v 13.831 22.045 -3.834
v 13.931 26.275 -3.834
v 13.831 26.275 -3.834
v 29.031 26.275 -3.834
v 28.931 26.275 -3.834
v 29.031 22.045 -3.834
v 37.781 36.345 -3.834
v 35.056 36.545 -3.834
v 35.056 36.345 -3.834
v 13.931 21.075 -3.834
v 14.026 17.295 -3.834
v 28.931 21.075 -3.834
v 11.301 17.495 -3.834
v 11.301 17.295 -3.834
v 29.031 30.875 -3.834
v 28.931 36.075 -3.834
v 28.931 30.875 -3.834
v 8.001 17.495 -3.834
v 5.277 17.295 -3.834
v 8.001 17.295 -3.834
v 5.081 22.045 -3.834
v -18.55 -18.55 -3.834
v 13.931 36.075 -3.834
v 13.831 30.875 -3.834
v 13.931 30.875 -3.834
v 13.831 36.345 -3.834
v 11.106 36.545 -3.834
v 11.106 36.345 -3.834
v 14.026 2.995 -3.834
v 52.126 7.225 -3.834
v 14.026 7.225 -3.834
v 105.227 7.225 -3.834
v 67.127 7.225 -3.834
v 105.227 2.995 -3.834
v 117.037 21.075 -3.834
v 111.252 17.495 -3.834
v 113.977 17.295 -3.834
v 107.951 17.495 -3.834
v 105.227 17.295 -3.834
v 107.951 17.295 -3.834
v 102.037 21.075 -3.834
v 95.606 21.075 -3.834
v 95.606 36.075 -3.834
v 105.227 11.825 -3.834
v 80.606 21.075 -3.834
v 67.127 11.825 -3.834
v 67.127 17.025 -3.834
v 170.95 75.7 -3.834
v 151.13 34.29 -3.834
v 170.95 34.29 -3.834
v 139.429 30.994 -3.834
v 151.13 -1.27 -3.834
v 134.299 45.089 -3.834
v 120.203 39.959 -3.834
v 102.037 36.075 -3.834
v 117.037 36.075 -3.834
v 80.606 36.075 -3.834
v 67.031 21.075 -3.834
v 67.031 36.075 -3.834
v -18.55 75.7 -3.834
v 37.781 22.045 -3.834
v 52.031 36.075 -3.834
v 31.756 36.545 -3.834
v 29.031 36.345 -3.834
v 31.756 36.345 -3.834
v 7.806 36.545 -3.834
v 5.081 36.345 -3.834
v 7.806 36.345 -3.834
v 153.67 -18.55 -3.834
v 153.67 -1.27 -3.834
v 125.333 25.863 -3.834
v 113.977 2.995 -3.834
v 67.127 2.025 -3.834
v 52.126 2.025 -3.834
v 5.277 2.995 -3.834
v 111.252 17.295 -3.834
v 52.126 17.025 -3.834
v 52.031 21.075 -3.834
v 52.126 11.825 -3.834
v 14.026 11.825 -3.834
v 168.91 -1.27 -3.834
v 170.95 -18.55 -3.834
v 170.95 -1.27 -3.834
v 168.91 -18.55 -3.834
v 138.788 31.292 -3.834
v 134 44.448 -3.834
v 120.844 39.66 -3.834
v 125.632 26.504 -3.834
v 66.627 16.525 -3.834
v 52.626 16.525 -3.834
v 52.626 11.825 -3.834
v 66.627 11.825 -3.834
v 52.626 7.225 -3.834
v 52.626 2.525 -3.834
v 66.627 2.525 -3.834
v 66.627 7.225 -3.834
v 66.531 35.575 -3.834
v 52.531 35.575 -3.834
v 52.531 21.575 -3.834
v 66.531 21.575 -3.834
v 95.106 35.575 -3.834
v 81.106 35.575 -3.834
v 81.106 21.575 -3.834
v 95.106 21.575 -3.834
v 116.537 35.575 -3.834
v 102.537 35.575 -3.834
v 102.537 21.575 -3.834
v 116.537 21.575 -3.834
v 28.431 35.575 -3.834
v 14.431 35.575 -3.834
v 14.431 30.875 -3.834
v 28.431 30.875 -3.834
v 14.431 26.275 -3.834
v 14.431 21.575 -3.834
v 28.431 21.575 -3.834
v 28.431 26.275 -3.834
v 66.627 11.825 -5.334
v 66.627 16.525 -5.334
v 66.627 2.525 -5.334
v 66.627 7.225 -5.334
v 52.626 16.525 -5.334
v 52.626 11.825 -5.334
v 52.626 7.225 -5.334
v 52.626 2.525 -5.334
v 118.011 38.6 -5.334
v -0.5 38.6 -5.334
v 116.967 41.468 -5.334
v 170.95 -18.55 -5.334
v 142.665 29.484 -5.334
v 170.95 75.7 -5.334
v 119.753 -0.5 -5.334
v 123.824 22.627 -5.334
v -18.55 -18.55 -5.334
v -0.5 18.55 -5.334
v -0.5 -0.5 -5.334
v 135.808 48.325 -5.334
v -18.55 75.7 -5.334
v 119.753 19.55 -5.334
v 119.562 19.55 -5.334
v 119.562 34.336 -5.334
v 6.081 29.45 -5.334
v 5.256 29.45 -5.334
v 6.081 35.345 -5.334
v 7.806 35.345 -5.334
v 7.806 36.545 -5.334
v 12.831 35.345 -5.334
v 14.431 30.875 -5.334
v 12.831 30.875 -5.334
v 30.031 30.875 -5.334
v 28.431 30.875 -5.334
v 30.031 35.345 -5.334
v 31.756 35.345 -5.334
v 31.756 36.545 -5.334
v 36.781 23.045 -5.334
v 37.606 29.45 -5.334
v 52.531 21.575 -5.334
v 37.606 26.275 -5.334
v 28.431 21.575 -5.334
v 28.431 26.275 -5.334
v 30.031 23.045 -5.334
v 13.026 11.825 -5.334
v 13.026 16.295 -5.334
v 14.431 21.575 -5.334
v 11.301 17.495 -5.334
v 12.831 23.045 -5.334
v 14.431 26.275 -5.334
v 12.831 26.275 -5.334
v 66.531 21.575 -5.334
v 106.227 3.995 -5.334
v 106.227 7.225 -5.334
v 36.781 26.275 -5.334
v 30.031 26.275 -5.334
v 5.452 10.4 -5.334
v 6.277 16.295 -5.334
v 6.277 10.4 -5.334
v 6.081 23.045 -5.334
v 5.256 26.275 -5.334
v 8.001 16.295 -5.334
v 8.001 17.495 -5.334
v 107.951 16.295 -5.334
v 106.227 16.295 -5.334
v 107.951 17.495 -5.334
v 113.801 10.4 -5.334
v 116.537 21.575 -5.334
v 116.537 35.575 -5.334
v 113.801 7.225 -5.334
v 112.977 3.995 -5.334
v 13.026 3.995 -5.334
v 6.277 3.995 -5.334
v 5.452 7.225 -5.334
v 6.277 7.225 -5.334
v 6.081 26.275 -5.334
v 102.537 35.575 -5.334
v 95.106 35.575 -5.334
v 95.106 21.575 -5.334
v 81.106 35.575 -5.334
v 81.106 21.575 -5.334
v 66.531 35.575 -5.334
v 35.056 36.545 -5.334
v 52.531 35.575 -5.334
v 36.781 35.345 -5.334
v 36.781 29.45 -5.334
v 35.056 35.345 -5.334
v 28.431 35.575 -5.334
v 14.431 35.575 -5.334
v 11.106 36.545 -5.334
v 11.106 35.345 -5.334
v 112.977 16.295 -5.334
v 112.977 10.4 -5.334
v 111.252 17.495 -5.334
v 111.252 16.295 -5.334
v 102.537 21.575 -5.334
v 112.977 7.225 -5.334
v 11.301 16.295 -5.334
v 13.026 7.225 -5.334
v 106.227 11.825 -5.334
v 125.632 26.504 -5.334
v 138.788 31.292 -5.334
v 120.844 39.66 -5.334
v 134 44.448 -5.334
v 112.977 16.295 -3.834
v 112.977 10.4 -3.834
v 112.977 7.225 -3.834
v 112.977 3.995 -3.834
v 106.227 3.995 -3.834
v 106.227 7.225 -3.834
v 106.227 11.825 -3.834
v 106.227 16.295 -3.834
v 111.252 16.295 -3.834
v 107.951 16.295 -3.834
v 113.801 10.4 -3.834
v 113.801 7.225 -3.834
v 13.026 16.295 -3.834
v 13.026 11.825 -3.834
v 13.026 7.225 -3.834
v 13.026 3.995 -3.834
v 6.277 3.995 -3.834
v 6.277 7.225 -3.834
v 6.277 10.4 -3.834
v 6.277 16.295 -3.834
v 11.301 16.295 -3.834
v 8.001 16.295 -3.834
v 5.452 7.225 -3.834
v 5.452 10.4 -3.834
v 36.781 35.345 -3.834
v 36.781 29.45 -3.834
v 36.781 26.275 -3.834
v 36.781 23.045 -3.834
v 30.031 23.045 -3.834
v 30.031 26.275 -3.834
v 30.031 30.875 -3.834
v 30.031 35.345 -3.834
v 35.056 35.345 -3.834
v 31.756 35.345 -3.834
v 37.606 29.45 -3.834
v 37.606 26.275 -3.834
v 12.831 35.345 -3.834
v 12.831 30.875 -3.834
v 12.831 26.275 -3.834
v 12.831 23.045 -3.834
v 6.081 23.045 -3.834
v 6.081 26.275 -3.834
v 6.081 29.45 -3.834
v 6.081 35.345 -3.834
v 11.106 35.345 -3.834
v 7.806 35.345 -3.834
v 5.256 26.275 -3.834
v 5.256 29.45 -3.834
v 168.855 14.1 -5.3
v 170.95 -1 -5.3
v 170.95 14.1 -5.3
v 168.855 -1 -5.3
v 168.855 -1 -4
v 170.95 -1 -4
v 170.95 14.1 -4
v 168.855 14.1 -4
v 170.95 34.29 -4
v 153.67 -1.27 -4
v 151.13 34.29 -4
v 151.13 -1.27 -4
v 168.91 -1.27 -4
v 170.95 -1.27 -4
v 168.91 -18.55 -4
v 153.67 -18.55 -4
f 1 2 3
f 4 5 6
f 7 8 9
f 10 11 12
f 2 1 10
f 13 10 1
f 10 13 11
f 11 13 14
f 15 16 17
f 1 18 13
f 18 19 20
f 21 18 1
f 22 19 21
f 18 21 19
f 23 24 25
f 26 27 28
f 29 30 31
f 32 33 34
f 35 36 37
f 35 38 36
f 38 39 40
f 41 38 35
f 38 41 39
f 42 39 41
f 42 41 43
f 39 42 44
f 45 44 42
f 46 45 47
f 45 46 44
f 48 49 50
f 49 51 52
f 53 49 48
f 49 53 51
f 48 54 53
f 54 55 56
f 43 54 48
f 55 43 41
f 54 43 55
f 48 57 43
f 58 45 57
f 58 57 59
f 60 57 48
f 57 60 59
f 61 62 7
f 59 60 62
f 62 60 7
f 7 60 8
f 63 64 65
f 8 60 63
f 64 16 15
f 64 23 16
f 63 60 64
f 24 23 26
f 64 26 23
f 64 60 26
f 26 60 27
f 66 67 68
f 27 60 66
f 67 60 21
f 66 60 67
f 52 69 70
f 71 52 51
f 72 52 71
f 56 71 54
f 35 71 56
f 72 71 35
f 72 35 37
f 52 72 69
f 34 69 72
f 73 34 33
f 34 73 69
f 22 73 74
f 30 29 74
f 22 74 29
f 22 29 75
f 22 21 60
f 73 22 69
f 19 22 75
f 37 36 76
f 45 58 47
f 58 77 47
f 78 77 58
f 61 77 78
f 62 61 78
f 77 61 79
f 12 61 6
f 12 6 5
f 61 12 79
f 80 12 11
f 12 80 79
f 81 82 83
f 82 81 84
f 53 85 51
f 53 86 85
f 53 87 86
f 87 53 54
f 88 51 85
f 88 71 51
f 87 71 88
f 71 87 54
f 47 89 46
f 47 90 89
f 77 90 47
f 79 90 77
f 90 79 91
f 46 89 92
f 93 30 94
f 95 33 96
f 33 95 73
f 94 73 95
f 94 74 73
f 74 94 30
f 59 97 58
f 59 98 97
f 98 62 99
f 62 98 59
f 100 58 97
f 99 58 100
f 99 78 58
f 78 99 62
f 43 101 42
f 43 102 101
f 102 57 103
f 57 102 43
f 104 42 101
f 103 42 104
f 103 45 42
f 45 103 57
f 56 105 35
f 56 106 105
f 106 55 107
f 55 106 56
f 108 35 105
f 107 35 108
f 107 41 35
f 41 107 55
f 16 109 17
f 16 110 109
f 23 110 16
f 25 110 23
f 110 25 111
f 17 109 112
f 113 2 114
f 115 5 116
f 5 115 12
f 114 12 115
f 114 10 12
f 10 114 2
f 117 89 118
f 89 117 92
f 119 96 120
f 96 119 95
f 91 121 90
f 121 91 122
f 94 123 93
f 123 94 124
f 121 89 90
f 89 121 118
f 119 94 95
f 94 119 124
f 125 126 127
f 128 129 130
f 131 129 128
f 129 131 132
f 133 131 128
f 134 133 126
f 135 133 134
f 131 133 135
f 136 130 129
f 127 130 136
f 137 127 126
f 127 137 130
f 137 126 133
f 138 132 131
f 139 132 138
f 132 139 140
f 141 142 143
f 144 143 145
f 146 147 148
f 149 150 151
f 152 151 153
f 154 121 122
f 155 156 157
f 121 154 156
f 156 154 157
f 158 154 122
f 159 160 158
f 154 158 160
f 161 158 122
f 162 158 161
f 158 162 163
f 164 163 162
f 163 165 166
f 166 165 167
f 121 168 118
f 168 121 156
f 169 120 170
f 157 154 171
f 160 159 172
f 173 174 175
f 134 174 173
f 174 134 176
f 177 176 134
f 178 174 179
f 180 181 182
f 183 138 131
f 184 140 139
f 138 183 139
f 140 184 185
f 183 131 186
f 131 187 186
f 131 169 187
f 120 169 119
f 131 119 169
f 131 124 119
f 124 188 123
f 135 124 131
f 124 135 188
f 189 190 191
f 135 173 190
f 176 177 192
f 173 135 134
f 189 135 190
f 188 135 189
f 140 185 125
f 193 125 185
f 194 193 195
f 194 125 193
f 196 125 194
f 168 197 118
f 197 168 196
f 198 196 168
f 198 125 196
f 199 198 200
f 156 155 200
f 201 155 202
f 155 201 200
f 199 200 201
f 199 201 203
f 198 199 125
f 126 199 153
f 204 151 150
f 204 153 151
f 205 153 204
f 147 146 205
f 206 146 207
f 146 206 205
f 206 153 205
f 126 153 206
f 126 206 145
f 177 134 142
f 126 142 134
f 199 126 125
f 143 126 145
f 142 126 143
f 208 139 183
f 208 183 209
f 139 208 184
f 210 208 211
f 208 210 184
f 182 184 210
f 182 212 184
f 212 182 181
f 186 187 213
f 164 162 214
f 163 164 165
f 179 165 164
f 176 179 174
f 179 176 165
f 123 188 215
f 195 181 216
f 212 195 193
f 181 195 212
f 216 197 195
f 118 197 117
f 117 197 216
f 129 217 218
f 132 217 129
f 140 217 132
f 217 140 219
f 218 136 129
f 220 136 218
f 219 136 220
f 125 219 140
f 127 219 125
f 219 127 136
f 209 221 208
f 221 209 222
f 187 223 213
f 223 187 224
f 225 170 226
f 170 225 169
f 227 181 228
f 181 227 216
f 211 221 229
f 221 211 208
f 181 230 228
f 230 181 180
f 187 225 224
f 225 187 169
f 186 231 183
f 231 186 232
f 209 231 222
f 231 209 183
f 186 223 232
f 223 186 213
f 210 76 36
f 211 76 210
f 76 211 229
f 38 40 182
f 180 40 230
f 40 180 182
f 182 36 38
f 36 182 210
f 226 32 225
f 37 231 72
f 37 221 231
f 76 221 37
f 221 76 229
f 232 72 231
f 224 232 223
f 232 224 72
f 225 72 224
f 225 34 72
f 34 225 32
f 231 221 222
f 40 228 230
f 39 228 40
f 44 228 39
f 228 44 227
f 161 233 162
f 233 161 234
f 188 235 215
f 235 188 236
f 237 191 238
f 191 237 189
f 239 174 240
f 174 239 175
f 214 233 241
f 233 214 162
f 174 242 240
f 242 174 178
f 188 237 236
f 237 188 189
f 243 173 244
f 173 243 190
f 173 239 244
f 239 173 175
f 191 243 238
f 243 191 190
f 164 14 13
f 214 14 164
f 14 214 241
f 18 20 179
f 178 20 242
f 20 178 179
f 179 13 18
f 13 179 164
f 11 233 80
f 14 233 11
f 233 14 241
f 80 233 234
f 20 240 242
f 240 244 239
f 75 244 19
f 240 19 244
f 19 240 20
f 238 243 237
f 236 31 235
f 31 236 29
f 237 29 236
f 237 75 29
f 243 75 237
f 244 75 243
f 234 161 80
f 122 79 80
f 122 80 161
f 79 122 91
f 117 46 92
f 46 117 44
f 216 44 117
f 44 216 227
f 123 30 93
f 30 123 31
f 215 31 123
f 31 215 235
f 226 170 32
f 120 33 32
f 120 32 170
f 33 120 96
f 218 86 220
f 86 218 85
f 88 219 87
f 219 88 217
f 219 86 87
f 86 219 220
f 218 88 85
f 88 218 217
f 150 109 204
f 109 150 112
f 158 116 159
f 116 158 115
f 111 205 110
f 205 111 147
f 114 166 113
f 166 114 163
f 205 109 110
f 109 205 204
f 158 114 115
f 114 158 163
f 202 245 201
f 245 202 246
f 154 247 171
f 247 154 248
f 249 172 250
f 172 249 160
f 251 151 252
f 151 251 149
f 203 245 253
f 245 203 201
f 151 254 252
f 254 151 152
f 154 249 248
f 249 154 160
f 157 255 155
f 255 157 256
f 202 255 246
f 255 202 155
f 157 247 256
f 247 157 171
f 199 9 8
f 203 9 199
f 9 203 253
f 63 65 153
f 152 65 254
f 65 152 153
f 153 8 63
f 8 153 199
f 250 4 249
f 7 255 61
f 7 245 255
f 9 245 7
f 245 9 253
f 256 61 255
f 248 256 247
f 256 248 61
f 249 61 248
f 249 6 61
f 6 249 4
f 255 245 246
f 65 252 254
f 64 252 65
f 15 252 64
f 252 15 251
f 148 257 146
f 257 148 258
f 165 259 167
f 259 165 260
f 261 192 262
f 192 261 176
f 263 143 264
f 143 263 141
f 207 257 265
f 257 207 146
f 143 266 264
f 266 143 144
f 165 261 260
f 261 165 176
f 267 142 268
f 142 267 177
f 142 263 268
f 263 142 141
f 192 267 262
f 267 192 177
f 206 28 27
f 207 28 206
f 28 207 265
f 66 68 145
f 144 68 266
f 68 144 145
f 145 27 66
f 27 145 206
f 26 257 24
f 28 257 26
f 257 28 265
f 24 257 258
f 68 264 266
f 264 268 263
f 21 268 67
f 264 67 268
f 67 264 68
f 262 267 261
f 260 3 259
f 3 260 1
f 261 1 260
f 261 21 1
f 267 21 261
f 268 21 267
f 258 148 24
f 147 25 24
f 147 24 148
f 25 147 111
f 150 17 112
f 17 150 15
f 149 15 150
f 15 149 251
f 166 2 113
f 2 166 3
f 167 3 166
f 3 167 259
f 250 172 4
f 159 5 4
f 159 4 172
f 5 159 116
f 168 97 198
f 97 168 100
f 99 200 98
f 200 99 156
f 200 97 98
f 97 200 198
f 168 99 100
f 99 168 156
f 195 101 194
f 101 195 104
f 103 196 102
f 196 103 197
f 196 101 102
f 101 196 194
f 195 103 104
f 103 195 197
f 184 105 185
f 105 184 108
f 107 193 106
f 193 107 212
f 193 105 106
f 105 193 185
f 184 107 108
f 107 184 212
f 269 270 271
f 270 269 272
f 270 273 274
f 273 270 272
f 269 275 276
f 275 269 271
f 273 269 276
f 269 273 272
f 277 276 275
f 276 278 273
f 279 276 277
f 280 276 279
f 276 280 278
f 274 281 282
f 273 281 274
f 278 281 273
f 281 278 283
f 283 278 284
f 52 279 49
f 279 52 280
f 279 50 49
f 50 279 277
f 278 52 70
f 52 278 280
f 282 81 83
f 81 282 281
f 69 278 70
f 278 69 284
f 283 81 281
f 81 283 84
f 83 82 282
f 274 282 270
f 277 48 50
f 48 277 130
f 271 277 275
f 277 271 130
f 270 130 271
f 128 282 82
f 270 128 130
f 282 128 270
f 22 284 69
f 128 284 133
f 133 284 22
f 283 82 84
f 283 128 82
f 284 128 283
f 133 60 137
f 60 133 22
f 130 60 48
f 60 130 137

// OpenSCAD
// file: ../../../lib/circuits/helpers.scad
function bu(u) = u * 2.54;

module breadboard_row(number, orientation="vertical") {
  children();
  if(number > 1) {
    if(orientation == "vertical") {
      translate([0,bu(1),0])
        breadboard_row(number-1, orientation=orientation) {
          children();
        }
    } else {
      translate([bu(1),0,0])
        breadboard_row(number-1, orientation=orientation){
          children();
        }
    }
  }
}
// file: ../../../lib/switches/rgb.scad
include <../variables.scad>

module rgb_row_trace_connection(width, height, xpos, ypos, rgb, connections) {
  half_width = u_mm(width)/2;
  half_height = u_mm(height)/2;
  if(connections[3] == "connect") {
    translate([1-half_width,8.875,0]){
      circle(d=0.8,$fn=40);
      offset(0.4)
        polygon(points=[[0,-0.01],[0,0.01],[u_mm(-xpos)-2, u_mm(-ypos)+0.01],[u_mm(-xpos)-2, u_mm(-ypos)-0.01]]);
    }
    translate([1-half_width,4.9,0]){
      circle(d=0.8,$fn=40);
      offset(0.4)
        polygon(points=[[0,-0.01],[0,0.01],[u_mm(-xpos)-2, u_mm(-ypos)+0.01],[u_mm(-xpos)-2, u_mm(-ypos)-0.01]]);
    }
    translate([1-half_width,3.3,0]){
      circle(d=0.8,$fn=40);
      offset(0.4)
        polygon(points=[[0,-0.01],[0,0.01],[u_mm(-xpos)-2, u_mm(-ypos)+0.01],[u_mm(-xpos)-2, u_mm(-ypos)-0.01]]);
    }
  }
  if(connections[2] == "connect") {
    translate([half_width-1,8.875,0]) {
      circle(d=0.8,$fn=40);
    }
    translate([half_width-1,4.9,0]) {
      circle(d=0.8,$fn=40);
    }
    translate([half_width-1,3.3,0]){
      circle(d=0.8,$fn=40);
    }
  }
}

module rgb_pcb_drill(width=1, height=1, rgb=true, connections=["hole","hole","hole","hole"]) {
  half_width = u_mm(width)/2;
  half_height = u_mm(height)/2;
  translate([half_width,half_height,0]) {
    if(rgb == true) {
      // LED Hole
      translate([-1.875,3.4])
        square([3.75,3]);

      // LED D
      if(connections[3] == "hole")
        translate([1.3-half_width,8,0])
          circle(d=1,$fn=40);
      if(connections[2] == "hole")
        translate([half_width-1.3,8,0])
          circle(d=1,$fn=40);

      // LED G
      if(connections[3] == "hole")
        translate([1.3-half_width,5.4,0])
          circle(d=1,$fn=40);
      if(connections[2] == "hole")
        translate([half_width-1.3,5.4,0])
          circle(d=1,$fn=40);

      // LED V
      if(connections[3] == "hole")
        translate([1.3-half_width,2.8,0])
          circle(d=1,$fn=40);
      if(connections[2] == "hole")
        translate([half_width-1.3,2.8,0])
          circle(d=1,$fn=40);
    }

    children();
  }
}

module rgb_pcb_hole_traces(width=1, height=1, rgb=true, xpos=0, ypos=0, connections=["hole","hole","hole","hole"]) {
  half_width = u_mm(width)/2;
  half_height = u_mm(height)/2;
  translate([half_width,half_height,0]) {
    if(rgb == true) {
      // LED D
      if(connections[3] == "hole")
        translate([1.3-half_width,8,0])
          circle(d=2.5,$fn=40);
      if(connections[2] == "hole")
        translate([half_width-1.3,8,0])
          circle(d=2.5,$fn=40);

      // LED G
      if(connections[3] == "hole")
        translate([1.3-half_width,5.4,0])
          circle(d=2.5,$fn=40);
      if(connections[2] == "hole")
        translate([half_width-1.3,5.4,0])
          circle(d=2.5,$fn=40);

      // LED V
      if(connections[3] == "hole")
        translate([1.3-half_width,2.8,0])
          circle(d=2.5,$fn=40);
      if(connections[2] == "hole")
        translate([half_width-1.3,2.8,0])
          circle(d=2.5,$fn=40);
    }

    children();
  }
}

module rgb_pcb_traces(width=1, height=1, rgb=true, xpos=0, ypos=0, connections=["hole","hole","hole","hole"]) {
  half_width = u_mm(width)/2;
  half_height = u_mm(height)/2;
  rgb_pcb_hole_traces(width=width, height=height, rgb=rgb, connections=connections) {
    if(rgb == true) {
      rgb_row_trace_connection(width=width, height=height, xpos=xpos, ypos=ypos, rgb=rgb, connections=connections);
      v_left = connections[3] == "none" ? 1 : half_width-5;
      // LED G
      translate([1.25,5])
        square([2,2]);
      translate([2.7,8.5,0]) {
        length = connections[2] == "none" ? 2 : half_width-3.7; 
        square([length,0.75]);
      }
      translate([2.7,6.8])
        square([0.8,2.4]);
      translate([-3.5,6.2])
        square([7,0.8]);
      translate([-3.5,6.8])
        square([0.8,2.4]);
      translate([-4-v_left,8.5,0])
        square([v_left+1,0.75]);

      // LED D
      translate([-4-v_left,4.5,0])
        square([v_left,0.8]);
      translate([-4.5,4.5,0])
        square([0.8,1.3]);
      translate([-4.5,5,0])
        square([1.3,0.8]);
      translate([2,4,0])
        square([2,0.8]);
      translate([4,4,0])
        square([0.8,1.3]);
      translate([4,4.5,0]) {
        length = connections[2] == "none" ? 0 : half_width-5; 
        square([length,0.75]);
      }
      translate([-3.375,5])
        square([2,1.1]);
      translate([1.25,3.75])
        square([2,1.1]);

      // LED V
      v_right = connections[2] == "none" ? 0 : half_width-5.25;
      translate([-4-v_left,2.9,0])
        square([v_right+v_left+8.875,0.8]);
      translate([-3.375,3.5])
        square([2,1.35]);
    }

    children();
  }
}
// file: ../../../lib/switches/base.scad
include <../variables.scad>
include <rgb.scad>

// ["top", "bottom", "left", "right"]

module switch_row_trace_connection(width, height, xpos, ypos, rgb, connections) {
  half_width = u_mm(width)/2;
  half_height = u_mm(height)/2;
  if(connections[3] == "connect") {
    translate([1-half_width,-5.5,0]){
      circle(d=0.8,$fn=40);
      offset(0.4)
        polygon(points=[[0,-0.01],[0,0.01],[u_mm(-xpos)-2, u_mm(-ypos)+0.01],[u_mm(-xpos)-2, u_mm(-ypos)-0.01]]);
    }
  }
  if(connections[2] == "connect") {
    translate([half_width-1,-5.5,0]) {
      circle(d=0.8,$fn=40);
    }
  }
}

module switch_column_trace_connection(width, height, xpos, ypos, rgb, connections, last_xpos=0, last_ypos=0) {
  half_width = u_mm(width)/2;
  half_height = u_mm(height)/2;
  if(connections[1] == "connect") {
    translate([-u_mm((width-1)/2)-0.9,half_height-1,0]) {
      circle(d=0.8,$fn=40);
      offset(0.4)
        polygon(points=[[0,-0.01],[0,0.01],[u_mm((width-1)/2),0.01],[u_mm((width-1)/2),-0.01]]);
    }
  }
  if(connections[0] == "connect") {
    y_off = u_mm(ypos-last_ypos);
    x_off = u_mm(last_xpos-xpos);
    translate([-0.875,-1-y_off-half_height,0]) {
      offset(0.4)
        polygon(points=[[-0.01+x_off,0],[0.01+x_off,0],[0.01,2+y_off],[-0.01,2+y_off]]);
      translate([x_off-0.01,0]) {
        offset(0.4)
          polygon(points=[[0,-0.01],[0,0.01],[u_mm((width-1)/2)+1,0.01],[u_mm((width-1)/2)+1,-0.01]]);
      }
    }
  }
}

module switch_base_pcb_drill(width=1, height=1, rgb=true, single=true, connections=["hole","hole","hole","hole"]) {
  half_width = u_mm(width)/2;
  half_height = u_mm(height)/2;
  rgb_pcb_drill(width=width, height=height, rgb=rgb, connections=connections) {
    // Row
    if(connections[2] == "hole")
      translate([half_width-1.3,-5.5,0])
        circle(d=1,$fn=40);
    if(connections[3] == "hole")
      translate([1.3-half_width,-5.5,0])
        circle(d=1,$fn=40);

    // Column
    if(connections[1] == "hole")
      translate([-1,half_height-1.25,0])
        circle(d=1,$fn=40);
    if(connections[0] == "hole")
      translate([-1,1.25-half_height,0])
        circle(d=1,$fn=40);

    children();
  }
}

module switch_base_pcb_traces(width=1, height=1, rgb=true, xpos=0, ypos=0, connections=["hole","hole","hole","hole"], last_xpos=0, last_ypos=0, single=true) {
  half_width = u_mm(width)/2;
  half_height = u_mm(height)/2;
  rgb_pcb_traces(width=width, height=height, rgb=rgb, xpos=xpos, ypos=ypos, connections=connections) {
    switch_row_trace_connection(width, height, xpos, ypos, rgb, connections);
    if(single && !rgb)
      switch_column_trace_connection(width, height, xpos, ypos, rgb, connections, last_xpos=last_xpos, last_ypos=last_ypos);

    // Row
    if(connections[2] == "hole")
      translate([half_width-1.3,-5.5,0])
        circle(d=2.5,$fn=40);
    if(connections[3] == "hole")
      translate([1.3-half_width,-5.5,0])
        circle(d=2.5,$fn=40);

    // Column
    if(connections[1] == "hole")
      translate([-1,half_height-1.25,0])
        circle(d=2.4,$fn=40);
    if(connections[0] == "hole")
      translate([-1,1.25-half_height,0])
        circle(d=2.4,$fn=40);

    children();
  }
}

module switch_base_pcb_traces_bottom(width=1, height=1, rgb=true, xpos=0, ypos=0, connections=["hole","hole","hole","hole"], last_xpos=0, last_ypos=0) {
  half_width = u_mm(width)/2;
  half_height = u_mm(height)/2;
  rgb_pcb_hole_traces(width=width, height=height, rgb=rgb, connections=connections) {
    switch_column_trace_connection(width, height, xpos, ypos, rgb, connections, last_xpos=last_xpos, last_ypos=last_ypos);

    // Row
    if(connections[2] == "hole")
      translate([half_width-1.3,-5.5,0])
        circle(d=2.5,$fn=40);
    if(connections[3] == "hole")
      translate([1.3-half_width,-5.5,0])
        circle(d=2.5,$fn=40);

    // Column
    if(connections[1] == "hole")
      translate([-1,half_height-1.25,0])
        circle(d=2.5,$fn=40);
    if(connections[0] == "hole")
      translate([-1,1.25-half_height,0])
        circle(d=2.5,$fn=40);

    children();
  }
}
// file: ../../../lib/switches/footprints.scad
include <../variables.scad>
include <stabilizers.scad>

module pcb_switch_outline(width=1, height=1) {
  stab_extra = width >= 2 ? 2 : 0;
  translate([0,-stab_extra])
    square([u_mm(width)+0.01, u_mm(height)+0.01+stab_extra]);
}

module pcb_switch_space_outline(width=1, height=1, style="mx", cnc=false) {
  offset = height_for_style(style);
  stab_extra = width >= 2 ? 2 : 0;
  translate([-1,-1-stab_extra,2.834-offset])
    cube([u_mm(width) + 2, u_mm(height) + 2 + stab_extra, 1.166+offset]);
  translate([u_mm(width/2),u_mm(height/2)]) {
    translate([-7.5,-7.5,1.5-offset])
      cube([15,15,5]);
    translate([-7,-7,-10])
      cube([14,14,10]);
    translate([u_mm(-width/2)-0.5,u_mm(-height/2)-0.5,-20-offset])
      cube([u_mm(width)+1,u_mm(height)+1, 20]);
  }
  translate([hole_offset(width), hole_offset(height),-10])
    stab(width);
}
// file: ../../../lib/switches/stabilizers.scad
module stab_hole_render(distance){
  translate([14+distance+3.375,6.99,0]) {
    circle(d=3.175, $fn=40);
    translate([0,-15.24,0])
      circle(d=4.064, $fn=40);
  }
  translate([-6.75-distance+3.375,6.99,0]) {
    circle(d=3.175, $fn=40);
    translate([0,-15.24,0])
      circle(d=4.064, $fn=40);
  }
}

module stab_holes(width) {
  if (width >= 7) {
    stab_hole_render(39.6);
  } else if (width >= 6) {
    stab_hole_render(39.6);
  } else if(width >= 2) {
    stab_hole_render(1.6);
  }
}

module stab_render(distance, cnc=false, height=5.334) {
  translate([14+distance,1.47,0]){
    // Right Side Large Hole
    cube([6.75,12.3,10]);

    // Add 1/16" corner holes for milling
    if(cnc){
      translate([0.56,0.56,0])
        cylinder(h=10,d=1.59,$fn=20);
      translate([6.75-0.56,0.56,0])
        cylinder(h=10,d=1.59,$fn=20);
      translate([0.56,12.3-0.56,0])
        cylinder(h=10,d=1.59,$fn=20);
      translate([6.75-0.56,12.3-0.56,0])
        cylinder(h=10,d=1.59,$fn=20);
    }
    translate([5.75,3.23,0]){
      // Side hole for notch
      cube([1.825,3.175,10]);
      translate([1.825,1.59,0])
        if(cnc)
          resize([1.59,3.175,10])
            cylinder(h=10,d=1.59,$fn=20);
    }
    translate([1.725,11.3,0]){
      // Top Notch
      cube([3.3,2.2,10]);
      if(cnc)
        translate([1.65,2.2,0])
          resize([3.3,1,10])
            cylinder(h=10,d=1,$fn=20);
    }
    // Thin out for clip
    translate([-1,-1,10-height+1.5])
      cube([8.75,14.3,height-1.5]);
  }
  translate([-6.75-distance,1.47,0]){
    // Left Side Large Hole
    cube([6.75,12.3,10]);
    translate([-0.825,3.23,0]){
      // Side hole for notch
      cube([1.825,3.175,10]);
      if(cnc)
        translate([0,1.59,0])
          resize([1.59,3.175,10])
            cylinder(h=10,d=1.59,$fn=20);

    }
    translate([1.725,11.3,0]){
      // Top Notch
      cube([3.3,2.2,10]);
      if(cnc)
        translate([1.65,2.2,0])
          resize([3.3,1,10])
            cylinder(h=10,d=1,$fn=20);
    }
    if(cnc){
      translate([0.56,0.56,0])
        cylinder(h=10,d=1.59,$fn=20);
      translate([6.75-0.56,0.56,0])
        cylinder(h=10,d=1.59,$fn=20);
      translate([0.56,12.3-0.56,0])
        cylinder(h=10,d=1.59,$fn=20);
      translate([6.75-0.56,12.3-0.56,0])
        cylinder(h=10,d=1.59,$fn=20);
    }
    // Thin out for clip
    translate([-1,-1,10-height+1.5])
      cube([8.75,14.3,height-1.5]);
  }
  // Center shaft for bar
  translate([-distance-2,4.7,0]){
    cube([distance*2+20,4.6,10]);
  }
}

module stab(key_width, cnc=false) {
  if (key_width >= 7) {
    stab_render(39.6, cnc=cnc);
  } else if (key_width >= 6) {
    stab_render(39.6, cnc=cnc);
  } else if(key_width >= 2) {
    stab_render(1.6, cnc=cnc);
  }
}
// file: ../../../lib/circuits/wire.scad
module guage(guage=12) {
  fn=20;
  if(guage == 8) {
    circle(d=3.25, $fn=fn);
  } else if (guage == 10) {
    circle(d=2.59, $fn=fn);
  } else if (guage == 12) {
    circle(d=2.06, $fn=fn);
  } else if (guage == 14) {
    circle(d=1.57, $fn=fn);
  } else if (guage == 16) {
    circle(d=1.3, $fn=fn);
  }
}

module wire_pcb_drill(guage=12) {
  offset(0.1)
    guage(guage);
}

module wire_pcb_traces(guage=12) {
  offset(0.75)
    guage(guage);
}

module wire_pcb_outline(guage=12) {
  offset(1.5)
    guage(guage);
}

module wire_space_outline(guage=12) {
  linear_extrude(10)
    offset(0.1)
      guage(guage);
}
// file: ../../../lib/circuits/trrs.scad
module trrs_post(d=1.2) {
  translate([0,-d/4,0]) {
    circle(d=d, $fn=20);
    translate([-d/2,0,0]) {
      square([d,(d/2-.2)]);
    }
    translate([0,(d/2-.2),0]) {
      circle(d=d, $fn=20);
    }
  }
}

module trrs_pcb_drill(side="left") {
  translate([2.8,1.5]) {
    circle(d=2, $fn=20);
  }
  translate([2.8,8.5]) {
    circle(d=2, $fn=20);
  }
  translate([0.5,11.3,0]) {
    trrs_post();
  }
  translate([5.1,3.2,0]) {
    trrs_post();
  }
  translate([5.1,6.2,0]) {
    trrs_post();
  }
  translate([5.1,10.2,0]) {
    trrs_post();
  }
  if(side != "none"){
    offset = side == "left" ? 7.6 : -2;
    translate([offset,11.3]) {
      circle(d=1.2, $fn=20);
    }
    translate([offset,8.3]) {
      circle(d=1.2, $fn=20);
    }
    translate([offset,5.3]) {
      circle(d=1.2, $fn=20);
    }
    translate([offset,2.2]) {
      circle(d=1.2, $fn=20);
    }
  }
}

module trrs_pcb_traces(side="left") {
  translate([-1,9.7,0]){
    difference() {
      square([3,3]);
      if(side == "right") {
        translate([3,-1.8]) {
          rotate(45) {
            square(2);
          }
        }
      }
    }
  }
  translate([3.6,1.2,0]){
    difference() {
      square([3,3.5]);
      if(side == "left") {
        translate([3,2.3]) {
          rotate(45) {
            square(2);
          }
        }
      }
    }
  }
  translate([3.6,4.8,0]){
    difference() {
        square([3,3.5]);
        if(side == "left") {
          translate([3,2.3]) {
            rotate(45) {
              square(2);
            }
          }
        }
    }
  }
  translate([3.6,8.4,0]){
    difference() {
      square([3,3.2]);
      if(side == "left") {
        translate([3,1.8]) {
          rotate(45) {
            square(2);
          }
        }
      }
    }
  }
  if(side != "none"){
    translate([side == "left" ? 7.6 : -2,0,0]){
      translate([0,11.3]) {
        circle(d=3, $fn=20);
      }
      translate([0,8.3]) {
        circle(d=2.9, $fn=20);
      }
      translate([0,5.3]) {
        circle(d=3, $fn=20);
      }
      translate([0,2.2]) {
        circle(d=3, $fn=20);
      }
    }
    translate([side == "left" ? 5.6 : -2,0,0]){
      left_trace = side == "left" ? 2.5 : 7.6;
      translate([0,2.2]) {
        square([left_trace,1.5]);
      }
      translate([0,5.1]) {
        square([left_trace,1.5]);
      }
      if(side == "left") {
        translate([0,8.7]) {
          square([left_trace,0.9]);
        }
      }
      else {
        translate([0,8]) {
          square([4,1.6]);
        }
        translate([4,9]) {
          square([4,1.6]);
        }
        translate([2.8,9.4]) {
          rotate(-45) {
            square([1,1.7]);
          }
        }
      }
    }
    translate([side == "left" ? 0.5 : -2,0,0]){
      right_trace = side == "left" ? 7.1 : 2;
      translate([0,11.7]) {
        square([right_trace,1.3]);
      }
      translate([0,12]) {
        circle(1, $fn=20);
      }
      translate([right_trace,11.8]) {
        circle(1, $fn=20);
      }
    }
  }
}

module trrs_pcb_outline(side="left") {
  translate([-1,0,0]) {
    square([7.6,13.1]);
  }
  if(side != "none"){
    translate([side == "left" ? 5.6 : -3.5, 0]) {
      square([4,13.1]);
    }
  }
}

module trrs_space_outline(side="left") {
  translate([0,0,-5.3]) {
    linear_extrude(7){
      translate([-2,-1,0])
        square([9.6,15.1]);
      translate([0,-12.1,0])
        square([5.6,12.1]);
      if(side != "none")
        translate([side == "left" ? 5.6 : -4.5, -1])
          square([5,15.1]);
    }
  }
  translate([3,-2,-2.6]) {
    rotate([90,0,0]) {
      cylinder(d=10, h=30, $fn=100);
    }
  }
}
// file: ../../../lib/circuits/trace.scad
function vdef(vector, index) = len(vector) == index ? vector[index-1] : vector[index];
function vadd(vector, index, axis) = vdef(vector, index)[axis] > vdef(vector, index-1)[axis] ? 0.01 : -0.01;
function polygon_from_vector(vector) = 
  len(vector) > 0 ?
    concat(vector, 
      [for (i = [1:len(vector)]) 
        [vector[len(vector)-i][0]-vadd(vector, i, 0),vector[len(vector)-i][1]-vadd(vector, i, 1)]])
      : [];

function parse_loc(loc) = [
  loc[5],
  len(loc) < 7 ? "both" : loc[6],
  len(loc) < 8 ? "none" : loc[7],
];

module manual_trace_pcb_drill(location) {
  vector = parse_loc(location)[0];
  echo("holes", parse_loc(location)[2]);
  if(parse_loc(location)[2] == "holes" || parse_loc(location)[2] == "hole_begin") {
    translate(vector[0]) {
      circle(d=1, $fn=20);
    }
  }
  if(parse_loc(location)[2] == "holes" || parse_loc(location)[2] == "hole_end") {
    translate(vector[len(vector)-1]) {
      circle(d=1, $fn=20);
    }
  }
}

module manual_trace_pcb_traces(location) {
  vector = parse_loc(location)[0];
  if(parse_loc(location)[1] != "bottom") {
    offset(0.4) {
      polygon(points=polygon_from_vector(vector));
    }
  }
  if(parse_loc(location)[2] == "holes" || parse_loc(location)[2] == "hole_begin") {
    translate(vector[0]) {
      circle(d=2.5, $fn=20);
    }
  }
  if(parse_loc(location)[2] == "holes" || parse_loc(location)[2] == "hole_end") {
    translate(vector[len(vector)-1]) {
      circle(d=2.5, $fn=20);
    }
  }
}

module manual_trace_pcb_traces_bottom(location) {
  vector = parse_loc(location)[0];
  if(parse_loc(location)[1] != "top") {
    offset(0.4) {
      polygon(points=polygon_from_vector(vector));
    }
  }
  if(parse_loc(location)[2] == "holes" || parse_loc(location)[2] == "hole_begin") {
    translate(vector[0]) {
      circle(d=2.5, $fn=20);
    }
  }
  if(parse_loc(location)[2] == "holes" || parse_loc(location)[2] == "hole_end") {
    translate(vector[len(vector)-1]) {
      circle(d=2.5, $fn=20);
    }
  }
}

module manual_trace_pcb_outline(location) {
  vector = parse_loc(location)[0];
  echo("location", location);
  offset(1)
    polygon(points=polygon_from_vector(vector));

  if(parse_loc(location)[2] == "holes" || parse_loc(location)[2] == "hole_begin") {
    translate(vector[0]) {
      circle(d=4, $fn=20);
    }
  }
  if(parse_loc(location)[2] == "holes" || parse_loc(location)[2] == "hole_end") {
    translate(vector[len(vector)-1]) {
      circle(d=4, $fn=20);
    }
  }
}

module manual_trace_space_outline(location) {
  vector = parse_loc(location)[0];
  translate([0,0,-1])
    linear_extrude(2)
      offset(0.5)
        manual_trace_pcb_outline(vector);
}
// file: ../../../lib/circuits/support.scad
module support_pcb_drill(mm=2) {
  offset(0.1)
    circle(d=mm, $fn=20);
}

module support_pcb_traces(mm=2) {
}

module support_pcb_outline(mm=2) {
  offset(2)
    circle(d=mm, $fn=20);
}

module support_space_outline(mm=2) {
  linear_extrude(10)
    offset(0.1)
      circle(d=mm, $fn=20);
}
// file: ../../../lib/circuits/proton_c.scad
use <helpers.scad>

module proton_c_pcb_drill(size="full") {
  translate([bu(0.5),bu(1.5),0]) {
    translate([0,bu(1)])
      breadboard_row(4, "horizontal"){
        circle(d=1, $fn=20);
        translate([0,bu(1)])
          circle(d=1, $fn=20);
      }
    translate([bu(4),bu(1)])
      breadboard_row(2)
        circle(d=1, $fn=20);
    translate([bu(4),bu(3)])
      breadboard_row(2)
        circle(d=1, $fn=20);
    circle(d=1, $fn=20);
    translate([bu(1),0,0])
      circle(d=1, $fn=20);
    translate([bu(5),0,0])
      circle(d=1, $fn=20);
    translate([bu(6),0,0])
      circle(d=1, $fn=20);
    breadboard_row(12) {
      circle(d=1, $fn=20);
      translate([bu(1),0,0])
        circle(d=1, $fn=20);
      translate([bu(5),0,0])
        circle(d=1, $fn=20);
      translate([bu(6),0,0])
        circle(d=1, $fn=20);
    }
    if(size == "full")
      translate([0,bu(13)])
        breadboard_row(6) {
          circle(d=1, $fn=20);
          translate([bu(1),0,0])
            circle(d=1, $fn=20);
          translate([bu(5),0,0])
            circle(d=1, $fn=20);
          translate([bu(6),0,0])
            circle(d=1, $fn=20);
    }
  }
}

module proton_c_pcb_traces(size="full") {
  translate([bu(0.5),bu(1.5),0]) {
    translate([0,bu(1)])
      breadboard_row(4, "horizontal"){
        circle(d=2.4, $fn=20);
        translate([-1,0])
          square([2,bu(1)]);
        translate([0,bu(1)])
          circle(d=2.4, $fn=20);
      }
    translate([0,bu(1)])
      breadboard_row(2) {
        translate([bu(5),0])
          circle(d=2.4, $fn=20);
        translate([bu(5),-1,0])
          square([bu(1),2]);
        translate([bu(6),0,0])
          circle(d=2.4, $fn=20);
      }
    translate([bu(4),bu(1)]){
      translate([-0.75,-1])
        square([1.5,bu(2)-2]);
      breadboard_row(2)
        circle(d=2.4, $fn=20);
      translate([0,-0.75])
        square([bu(2),1.5]);
    }
    translate([bu(4),bu(3)]){
      translate([-0.75,-1])
        square([1.5,bu(2)-2]);
      breadboard_row(2)
        circle(d=2.4, $fn=20);
      translate([0,-0.75])
        square([bu(2),1.5]);
    }
    circle(d=2.4, $fn=20);
    translate([0,-1,0])
      square([bu(1),2]);
    translate([bu(1),0,0])
      circle(d=2.4, $fn=20);
    translate([bu(5),0])
      circle(d=2.4, $fn=20);
    translate([bu(5),-1,0])
      square([bu(1),2]);
    translate([bu(6),0,0])
      circle(d=2.4, $fn=20);
    translate([0,bu(3)])
      breadboard_row(9) {
        circle(d=2.4, $fn=20);
        translate([0,-1,0])
          square([bu(1),2]);
        translate([bu(1),0,0])
          circle(d=2.4, $fn=20);
        translate([bu(5),0])
          circle(d=2.4, $fn=20);
        translate([bu(5),-1,0])
          square([bu(1),2]);
        translate([bu(6),0,0])
          circle(d=2.4, $fn=20);
      }
    if(size == "full")
      translate([0,bu(13)])
        breadboard_row(6) {
          circle(d=2.4, $fn=20);
          translate([0,-1,0])
            square([bu(1),2]);
          translate([bu(1),0,0])
            circle(d=2.4, $fn=20);
          translate([bu(5),0])
            circle(d=2.4, $fn=20);
          translate([bu(5),-1,0])
            square([bu(1),2]);
          translate([bu(6),0,0])
            circle(d=2.4, $fn=20);
        }
  }
}

module proton_c_pcb_outline(size="full") {
  translate([0,bu(1)])
  square([bu(7), bu(size == "full" ? 19 : 12)]);
}

module proton_c_space_outline(size="full") {
  translate([0,0,-4]) {
    linear_extrude(6) {
      translate([-bu(0.5),-bu(0.5)])
        square([bu(8), bu(size == "full" ? 21 : 14)]);
    }
    linear_extrude(5) {
      translate([bu(0.5),-bu(15),0])
        square([bu(6),bu(25)]);
    }
  }
}
// file: ../../../lib/circuits/pro_micro.scad
use <helpers.scad>

module pro_micro_pcb_drill(connections="holes") {
  translate([bu(0.5),bu(1.5),0]) {
    if(connections == "holes"){
      translate([bu(3),bu(1)])
        breadboard_row(3)
          circle(d=1, $fn=20);
      translate([bu(4),bu(3)])
        breadboard_row(3)
          circle(d=1, $fn=20);
    }
    breadboard_row(12) {
      circle(d=1, $fn=20);
      if(connections == "holes") {
        translate([bu(1),0,0])
          circle(d=1, $fn=20);
        translate([bu(5),0,0])
          circle(d=1, $fn=20);
      }
      translate([bu(6),0,0])
        circle(d=1, $fn=20);
    }
  }
}

module pro_micro_pcb_traces(connections="holes") {
  translate([bu(0.5),bu(1.5),0]) {
    // GRND
    if(connections == "holes"){
      translate([bu(3),bu(1)]){
        translate([-0.75,-1])
          square([1.5,bu(3)-2]);
        breadboard_row(3)
          circle(d=2.4, $fn=20);
        translate([0,-0.75])
          square([bu(2),1.5]);
      }
      translate([bu(4),bu(3)]){
        translate([-0.75,-1])
          square([1.5,bu(3)-2]);
        breadboard_row(3)
          circle(d=2.4, $fn=20);
        translate([0,-0.75])
          square([bu(2),1.5]);
      }
    }
    breadboard_row(12) {
      circle(d=2.4, $fn=20);
      if(connections == "holes") {
        translate([0,-1,0])
          square([bu(1),2]);
        translate([bu(1),0,0])
          circle(d=2.4, $fn=20);
        translate([bu(5),0])  
          circle(d=2.4, $fn=20);
        translate([bu(5),-1,0])
          square([bu(1),2]);
      }
      translate([bu(6),0,0])
        circle(d=2.4, $fn=20);
    }
  }
}

module pro_micro_pcb_outline() {
  translate([0,bu(1)])
  square([bu(7), bu(12)]);
}

module pro_micro_space_outline() {
  translate([0,0,-4]) {
    linear_extrude(6) {
      translate([-bu(0.5),-bu(0.5)])
        square([bu(8), bu(14)]);
    }
    linear_extrude(5) {
      translate([bu(0.5),-bu(15),0])
        square([bu(6),bu(25)]);
    }
  }
}
// file: ../../../lib/circuits/mts_101.scad
use <../variables.scad>
module mts_101_pcb_drill() {
  translate([0,1.25]) {
    translate([2.5,0])
      square([3,1]);
    translate([1.25,0.5])
      circle(d=1,$fn=40);
    translate([6.75,0.5])
      circle(d=1,$fn=40);

    translate([2.5,4.75])
      square([3,1]);
    translate([1.25,5.25])
      circle(d=1,$fn=40);
    translate([6.75,5.25])
      circle(d=1,$fn=40);

    translate([4,10])
      circle(d=1,$fn=40);
    translate([1.25,10])
      circle(d=1,$fn=40);
    translate([6.75,10])
      circle(d=1,$fn=40);
  }
}

module mts_101_pcb_traces() {
  translate([0,1.25]) {
    translate([2,-0.5])
      square([4,2]);
    translate([1.25,0.5])
      circle(d=2,$fn=40);
    translate([6.75,0.5])
      circle(d=2,$fn=40);

    translate([2,4.25])
      square([4,2]);
    translate([1.25,5.25])
      circle(d=2,$fn=40);
    translate([6.75,5.25])
      circle(d=2,$fn=40);

    translate([4,10])
      circle(d=2,$fn=40);
    translate([1.25,9.5])
      square([6,1]);
    translate([1.25,10])
      circle(d=2,$fn=40);
    translate([6.75,10])
      circle(d=2,$fn=40);
  }
}

module mts_101_pcb_outline() {
  square([8,13]);
}

module mts_101_space_outline(, cnc=false) {
  translate([-0.5,-0.5,-10])
    cube([9,14, 14.4]);
  translate([4,6.5,-26]) {
    cylinder(d=6, h=18, $fn=30);
    cylinder(d=12, h=10, $fn=60);
  }
}
// file: ../../../lib/circuits/ec11.scad
use <../variables.scad>
use <../switches/base.scad>

module 1u_centered() {
  translate([u_mm(0.5),u_mm(0.5)])
    children();
}

module ec11_pcb_drill(single=false, connections=["hole","hole","hole","hole"]) {
  switch_base_pcb_drill(rgb=false, connections=connections) {
    // Key Column
    translate([-3,0,0])
      circle(d=1,$fn=40);

    // Key Row
    translate([7,2.5])
      circle(d=1, $fn=20);

    if(single) {
      translate([4.25,-3,0])
        circle(d=1, $fn=20);
      translate([-3,-3.25,0])
        circle(d=1,$fn=40);
    }
    translate([4.25,0,0])
      circle(d=1, $fn=20);

    translate([7,-2.5])
      circle(d=1, $fn=20);

    if(connections[3] == "hole"){
      translate([-5.5,2.5])
        circle(d=1, $fn=20);
      translate([-5.5,0])
        circle(d=1, $fn=20);
      translate([-5.5,-2.5])
        circle(d=1, $fn=20);
    }
    translate([-7.5,-2.5])
      circle(d=1, $fn=20);
    translate([-7.5,2.5])
      circle(d=1, $fn=20);
    translate([-7.5,0])
      circle(d=1, $fn=20);

    translate([-1.3,-6.25])
      square([2.6,1.5]);
    translate([-1.3,4.75])
      square([2.6,1.5]);
  }
}

module ec11_pcb_traces(single=false, connections=["hole","hole","hole","hole"]) {
  switch_base_pcb_traces(single=single, rgb=false, connections=connections) {
    // Key Row
    if(single){
      translate([2,2.2])
        square([4.5,0.8]);
      r_len = connections[0] != "none" ? u_mm(0.5)-1 : 6;
      l_len = connections[1] != "none" ? u_mm(0.5)-1 : 6;
      translate([2,-r_len])
        square([0.8,r_len+l_len]);
      if(connections[0] != "none")
        translate([-2,1-u_mm(0.5)])
          square([4,0.8]);
      if(connections[1] != "none")
        translate([-2.1,u_mm(0.5)-1.6])
          square([4.9,0.8]);
    }
    translate([7,2.5])
      circle(d=2.5,$fn=40);

    // Key Column
    if(connections[3] != "none")
      translate([1-u_mm(0.5),-6])
        square([u_mm(0.5)-4,1]);
    translate([-3.25,-6])
      square([0.8,5]);
    translate([-3,0])
      circle(d=2.5,$fn=40);

    if(single){
      translate([-3,-3.25])
        circle(d=2.5,$fn=40);
      translate([4.25,-3])
        circle(d=2.5,$fn=40);
    } else {
      translate([-3,-3.25])
        square([7.8,0.8]);
    }

    translate([7,-2.5])
      circle(d=2.5,$fn=40);
    translate([4.25,0]) {
      circle(d=2.5,$fn=40);
      rotate(-45)
        square([5,0.8]);
    }

    translate([4,-6])
      square([0.8,3]);
    if(connections[2] != "none")
      translate([4,-6])
        square([4.5,0.8]);

    if(connections[3] == "hole"){
      translate([-5.5,2.5])
        circle(d=2.25, $fn=20);
      translate([-5.5,0])
        circle(d=2.25, $fn=20);
      translate([-5.5,-2.5])
        circle(d=2.25, $fn=20);
    }
    translate([-7.5,-2.5])
      circle(d=2.25, $fn=20);
    translate([-7.5,2.5])
      circle(d=2.25, $fn=20);
    translate([-7.5,0])
      circle(d=2.25, $fn=20);
  }
}

module ec11_pcb_traces_bottom(connections=["hole","hole","hole","hole"]) {
  switch_base_pcb_traces_bottom(rgb=false, connections=connections) {
    // Key Row
    translate([2,2.2])
      square([4.5,0.8]);
    r_len = connections[0] != "none" ? u_mm(0.5)-1 : 6;
    l_len = connections[1] != "none" ? u_mm(0.5)-1 : 6;
    translate([2,-r_len])
      square([0.8,r_len+l_len]);
    
    if(connections[0] != "none")
      translate([-1.3,1-u_mm(0.5)])
        square([4,0.8]);
    if(connections[1] != "none")
      translate([-1,u_mm(0.5)-1.4])
        square([3.8,0.8]);
    translate([7,2.5])
      circle(d=2.5,$fn=40);

    // Key Column
    translate([-3,0])
      circle(d=2.5,$fn=40);

    translate([7,-2.5])
      circle(d=2.5,$fn=40);
    translate([4.25,0]) {
      circle(d=2.5,$fn=40);
    }

    if(connections[3] == "hole"){
      translate([-5.5,2.5])
        circle(d=2.25, $fn=20);
      translate([-5.5,0])
        circle(d=2.25, $fn=20);
      translate([-5.5,-2.5])
        circle(d=2.25, $fn=20);
    }
    translate([-7.5,-2.5])
      circle(d=2.25, $fn=20);
    translate([-7.5,2.5])
      circle(d=2.25, $fn=20);
    translate([-7.5,0])
      circle(d=2.25, $fn=20);
  }
}

module ec11_pcb_outline() {
  square([u_mm(1), u_mm(1)]);
}

module ec11_space_outline() {
  translate([-0.5,-0.5, -6])
    cube([u_mm(1)+1, u_mm(1)+1, 8]);
  1u_centered() {
    translate([0,0,-15])
      linear_extrude(15)
        circle(d=7, $fn=30);
    translate([0,0,-25])
      linear_extrude(15)
        circle(d=19, $fn=80);
  }
}
// file: ../../../lib/switches/choc_v1.scad
include <../variables.scad>
include <stabilizers.scad>
include <footprints.scad>

module switch_choc_v1_pcb_drill(width=1, height=1) {
  half_width = u_mm(width)/2;
  half_height = u_mm(height)/2;
  translate([half_width,half_height,0]) {
    circle(d=3.5, $fn=30);

    translate([-5.5,0])
      circle(d=2, $fn=30);
    translate([3,3.8])
      circle(d=1, $fn=30);
    translate([-4, 3.8])
      circle(d=1, $fn=30);
    translate([-4,1.25-half_height])
      circle(d=1, $fn=30);
    translate([-4, half_height-3])
      circle(d=1, $fn=30);

    translate([5.5,0])
      circle(d=2, $fn=30);
    translate([0,5.9])
      circle(d=1.3, $fn=30);
    translate([5,3.8])
      circle(d=1.3, $fn=30);
    translate([1-half_width, half_height-1])
      circle(d=1, $fn=30);
    translate([half_width-1, half_height-1])
      circle(d=1, $fn=30);
  }
}

module switch_choc_v1_pcb_traces(width=1, height=1) {
  half_width = u_mm(width)/2;
  half_height = u_mm(height)/2;
  translate([half_width,half_height,0]) {
    translate([5,3.8])
      circle(d=2.8, $fn=30);
    translate([3,3.8])
      circle(d=2.5, $fn=30);
    translate([-4, 3.8])
      circle(d=2.5, $fn=30);
    translate([-4.5, 2-half_height])
      square([1, u_mm(height)-4]);
    translate([-4,1.25-half_height])
      circle(d=2.5, $fn=30);
    translate([-4, half_height-3])
      circle(d=2.5, $fn=30);

    translate([0,5.9])
      circle(d=2.8, $fn=30);
    translate([-0.5, 5.9])
      square([1, half_height-6.9]);
    translate([1-half_width, half_height-1.5])
      square([half_width*2-2, 1]);
    translate([1-half_width, half_height-1])
      circle(d=2.5, $fn=30);
    translate([half_width-1, half_height-1])
      circle(d=2.5, $fn=30);
  }
}

module switch_choc_v1_pcb_outline(width=1, height=1) {
  pcb_switch_outline(width=width, height=height);
}
// file: ../../../lib/switches/mx.scad
include <../variables.scad>
include <stabilizers.scad>
include <footprints.scad>
include <base.scad>
include <rgb.scad>

module switch_mx_pcb_drill(width=1, height=1, rgb=true, single=true, connections=["hole","hole","hole","hole"]) {
  half_width = u_mm(width)/2;
  half_height = u_mm(height)/2;
  translate([hole_offset(width), half_height]) {
    stab_holes(width);
  }

  switch_base_pcb_drill(width=width, height=height, single=single, rgb=rgb, connections=connections) {
    circle(d=4,$fn=40);
    translate([-3.8,-2.5,0])
      circle(d=1.7,$fn=40);
    translate([2.5,-5,0])
      circle(d=1.7,$fn=40);
    translate([5,0,0])
      circle(d=1.75,$fn=40);
    translate([-5,0,0])
      circle(d=1.75,$fn=40);

    // Column
    translate([-1.2,-3,0])
      circle(d=1,$fn=40);
    translate([5,-2,0])
      circle(d=1,$fn=40);
    if(single){
      translate([6,-3.7,0])
        circle(d=1,$fn=40);
      if(rgb) {
        translate([5,1.7,0])
          circle(d=1,$fn=40);
      } else {
        translate([6,-8.3,0])
          circle(d=1,$fn=40);
      }
    }
  }
}

module switch_mx_pcb_traces(width=1, height=1, rgb=true, single=true, xpos=0, ypos=0, connections=["hole","hole","hole","hole"], last_xpos=0, last_ypos=0) {
  half_width = u_mm(width)/2;
  half_height = u_mm(height)/2;
  switch_base_pcb_traces(width=width, height=height, rgb=rgb, xpos=xpos, ypos=ypos, connections=connections, last_xpos=last_xpos, last_ypos=last_ypos, single=single) {
    translate([-3.8,-2.5,0])
      circle(d=4,$fn=40);
    translate([2.5,-5,0])
      circle(d=4,$fn=40);

    // Row
    v_left = connections[3] == "none" ? 1 : half_width;
    v_right = connections[2] == "none" ? 1 : half_width-5;
    translate([1-v_left,-5.9,0])
      square([v_left+v_right+3,0.8]);

    // Column
    translate([-1.2,-3,0])
      circle(d=2.5,$fn=40);
    translate([5,-2,0])
      circle(d=2.5,$fn=40);
    if(single){
      translate([6,-3.7,0])
        circle(d=2.5,$fn=40);
      difference() {
        translate([5,0,0])
          circle(d=3.55,$fn=40);
        translate([5,-2,0])
          square(4);
      }
      if(rgb) {
        translate([5,1.7,0])
          circle(d=2.3,$fn=40);
      } else {
        translate([4.2,1])
          square([0.8, half_height-2]);
        translate([-1,half_height-1.5])
          square([6,0.8]);
        translate([6,-8.3,0])
          circle(d=2.5,$fn=40);
        translate([-1.3,-8.7,0])
          square([7,0.8]);
      }
    }
  }
}

module switch_mx_pcb_traces_bottom(width=1, height=1, rgb=true, xpos=0, ypos=0, connections=["hole","hole","hole","hole"], last_xpos=0, last_ypos=0) {
  half_width = u_mm(width)/2;
  half_height = u_mm(height)/2;
  switch_base_pcb_traces_bottom(width=width, height=height, rgb=rgb, xpos=xpos, ypos=ypos, connections=connections, last_xpos=last_xpos, last_ypos=last_ypos) {
    translate([-3.8,-2.5,0])
      circle(d=4,$fn=40);
    translate([2.5,-5,0])
      circle(d=4,$fn=40);

    // Column
    translate([-1.2,-3,0])
      circle(d=2.5,$fn=40);
    translate([5,-2,0])
      circle(d=2.5,$fn=40);
    difference(){
      translate([2.5,-5,0])
        circle(d=5.9,$fn=40);
      translate([2.5,-5,0])
        circle(d=4.1,$fn=40);
      translate([0.3,-7,0])
        rotate(45)
          square(6);
    }
    translate([3.85,-3.45])
      square([0.8, 1]);

    t_height = connections[0] == "none" ? 1 : half_height-7.8;
    echo("h", 2-half_height, t_height);
    translate([-1.3,-t_height-6.8])
      square([0.8, t_height]);
    translate([-1.3,-7.2])
      square([2.2,0.8]);
    difference() {
      translate([5,0,0])
        circle(d=3.35,$fn=40);
      translate([5,-2,0])
        square(4);
    }
    b_height = connections[1] == "none" ? 2 : half_height-2;
    translate([4.2,1])
      square([0.8, b_height]);
    if(connections[1] != "none")
      translate([-1,half_height-1.5])
        square([6,0.8]);
  }
}

module switch_mx_pcb_outline(width=1, height=1) {
  pcb_switch_outline(width=width, height=height);
}
// file: ../../../lib/utilities.scad
function reverse(list) = len(list) > 0 ? [for (i = [1:len(list)]) list[len(list)-i]] : [];
function pop(list) = len(list) > 0 ? [for (i = [0:len(list)-1]) if (i != 0) list[i]] : [];
// file: ../../../lib/switches.scad
use <utilities.scad>
include <switches/mx.scad>
include <switches/choc_v1.scad>

module rotate_translate(rotation, xpos, ypos) {
  if(rotation[0] == undef || rotation[0] == 0) {
    translate([u_mm(xpos), u_mm(ypos), 0]) {
      children();
    }
  } else {
    xoff = rotation[1] == undef ? 0 : rotation[1];
    yoff = rotation[2] == undef ? 0 : rotation[2];
    angle = rotation[0] == undef ? 0 : rotation[0];
    translate([u_mm(xpos - xoff), u_mm(ypos - yoff), 0])
      rotate(angle)
        translate([u_mm(xoff), u_mm(yoff), 0])
          children();
  }
}

module switch(type, style="mx", rgb=true, xpos=0, ypos=0, width=1, cnc=false, rotation=[0,0,0], connections=["hole","hole","hole","hole"], last_xpos=0, last_ypos=0) {
  rotate_translate(rotation, xpos, ypos) {
    if(type == "outline")
      pcb_switch_outline(width=width);
    if(style == "mx") {
      if(type == "key")
        pcb_switch_space_outline(width=width, cnc=cnc, style="mx");
      if(type == "traces")
        switch_mx_pcb_traces(width=width, rgb=rgb, xpos=xpos, ypos=ypos, connections=connections, last_xpos=last_xpos, last_ypos=last_ypos);
      if(type == "traces_top")
        switch_mx_pcb_traces(width=width, single=false, rgb=rgb, xpos=xpos, ypos=ypos, connections=connections, last_xpos=last_xpos, last_ypos=last_ypos);
      if(type == "traces_bottom")
        switch_mx_pcb_traces_bottom(width=width, rgb=rgb, xpos=xpos, ypos=ypos, connections=connections, last_xpos=last_xpos, last_ypos=last_ypos);
      if(type == "drill")
        switch_mx_pcb_drill(width=width, rgb=rgb, connections=connections);
      if(type == "drill_double")
        switch_mx_pcb_drill(width=width, single=false, rgb=rgb, connections=connections);
    }

    if(style == "choc_v1") {
      if(type == "key")
        pcb_switch_space_outline(width=width, cnc=cnc, style="choc_v1");
      if(type == "traces")
        switch_choc_v1_pcb_traces(width=width);
      if(type == "traces_top")
        switch_choc_v1_pcb_traces(width=width);
      if(type == "traces_bottom")
        assert(false, "traces_bottom is incompatible with choc_v1");
      if(type == "drill")
        switch_choc_v1_pcb_drill(width=width);
      if(type == "drill_double")
        switch_choc_v1_pcb_drill(width=width, single=false);
    }

    if(style == "redragon") {
      if(type == "key")
        pcb_switch_space_outline(width=width, cnc=cnc, style="redragon");
      if(type == "traces")
        switch_mx_pcb_traces(width=width, rgb=rgb);
      if(type == "traces_top")
        switch_mx_pcb_traces(width=width, single=false, rgb=rgb);
      if(type == "traces_bottom")
        switch_mx_pcb_traces_bottom(width=width, rgb=rgb);
      if(type == "traces")
        switch_mx_pcb_traces(width=width, rgb=rgb);
      if(type == "drill")
        switch_mx_pcb_drill(width=width);
      if(type == "drill_double")
        switch_mx_pcb_drill(width=width, single=false);
    }
  }
}

module switch_row(keys, style="mx", rgb=true, margin=5, thickness=10, depth=0, cnc=false, type="key", last_row=[], last_xpos=0, previous_xpos=0, last_ypos=0, previous_ypos=0) {
  width = keys[0][0] == undef ? 1 : keys[0][0];
  xpos = keys[0][1] == undef ? 0 : keys[0][1];
  ypos = keys[0][2] == undef ? 0 : keys[0][2];
  rotation = keys[0][3] == undef ? [0,0,0] : keys[0][3];
  connections = keys[0][4] == undef ? ["hole","hole","hole","hole"] : keys[0][4];
  last_ypos = last_row[0][2] == undef ? last_ypos - previous_ypos : last_row[0][2]+last_ypos - previous_ypos;
  last_xpos = last_row[0][1] == undef ? last_xpos - previous_xpos : last_row[0][1]+last_xpos - previous_xpos;
  switch(type, style=style, rgb=rgb, xpos=xpos, ypos=ypos, width=width, cnc=cnc, rotation=rotation, connections=connections, last_xpos=last_xpos, last_ypos=last_ypos);
  if(len(keys) > 1) {
    translate([xpos*key_size+width*key_size, ypos*key_size, 0])
      switch_row(pop(keys), style=style, rgb=rgb, margin=margin, thickness=thickness, depth=depth, cnc=cnc, type=type, last_row = pop(last_row), last_xpos=last_xpos, previous_xpos=xpos, last_ypos=last_ypos, previous_ypos=ypos);
  }
}

module switches(switches, style="mx", rgb=true, margin=5, thickness=10, depth=0, cnc=false, type="key", last_row=[]) {
  if(len(switches) != 0) {
    switch_row(switches[0], style=style, rgb=rgb, margin=margin, thickness=thickness, depth=depth, cnc=cnc, type=type, last_row=last_row);
    if(len(switches) > 1) {
      last_row = switches[0];
      translate([0, key_size, 0])
        switches(pop(switches), style=style, rgb=rgb, margin=margin, depth=depth, thickness=thickness, cnc=cnc, type=type, last_row=last_row);
    }
  }
}
// file: ../../../lib/case.scad
include <variables.scad>
use <utilities.scad>
use <circuits.scad>

function key_width(key) = (key[0] == undef ? 1 : key[0]) + (key[1] == undef ? 0 : key[1]);
function width_row(row) = len(row) == 0 ? 0 : key_width(row[0]) + width_row(pop(row));
function width_board(rows) = len(rows) == 0 ? 0 : (
  let (current = width_row(rows[0]))
  let (next = width_board(pop(rows)))
    current > next ? current : next);

function key_height(key) = (key[2] == undef ? 0 : key[2]);
function height_row(row) = len(row) == 0 ? [0,0] : (
  let(other_rows = height_row(pop(row)))
  let(current = key_height(row[0]) + other_rows[0])
  let(maximum = current > other_rows[1] ? current : other_rows[1])
  [current, maximum]);
function height_board_rec(rows) = len(rows) == 0 ? 0 : (
  let (current = height_row(reverse(rows[0]))[1])
  let (next = height_board_rec(pop(rows)))
    current > next ? current : next);
function height_board(rows) = 
  let (height_rec = height_board_rec(rows))
    len(rows) + (height_rec > 0 ? height_rec : 0);

module case(rows, style="mx", margin=5, thickness=5, depth=0, radius=2, rest=0, circuits=[], _inherit_children="unset") {
  total_thickness = thickness + depth + height_for_style(style);
  z_offset = depth + height_for_style(style);
  if($children != 0 && (_inherit_children == "unset" || _inherit_children > 0)) {
    translate([0, 0, -z_offset])
      linear_extrude(total_thickness)
        offset(margin)
          children();
  } else {
    width=u_mm(width_board(rows))+margin*2;
    height=u_mm(height_board(rows))+margin*2+rest;
    translate([-margin, -margin, -z_offset]){
      translate([radius, 0, 0])
        cube([width-radius*2, height,total_thickness]);
      translate([0, radius, 0])
        cube([width, height-radius*2,total_thickness]);
      translate([radius, radius, 0])
        cylinder(total_thickness,radius,radius, $fn=60);
      translate([width-radius, radius, 0])
        cylinder(total_thickness,radius,radius, $fn=60);
      translate([width-radius, height-radius, 0])
        cylinder(total_thickness,radius,radius, $fn=60);
      translate([radius, height-radius, 0])
        cylinder(total_thickness,radius,radius, $fn=60);
    }
    if(len(circuits) > 0)
      translate([0, 0, -z_offset])
        linear_extrude(total_thickness)
          offset(margin)
            circuits_pcb_outline(circuits);
  }
}
// file: ../../../lib/variables.scad
key_size=19.05;
hole=14;

function u_mm(u) = u*key_size;
function hole_offset(u) = (key_size-hole)/2+u_mm(u-1)/2;

// This is used to determine how much space is between the top
// of the plate and the PCB.
function height_for_style(style) = style == "mx"        ? 5.334 :
                                   style == "redragon" ? 3.75  :
                                   style == "choc_v1"   ? 2.2   :  "invalid style";
// file: base.scad
function circuit() = [[8,0,0,0,"pro_micro"],[9.1,0,0,0,"trrs_right"],];

function layout() = [
  [[6.26], [1,1,1,[20,1,2]]],
  [[2.25],[1.75],[1.25],[]]
];

module the_case() {
  translate([-u_mm(1), -u_mm(1)])
    square([u_mm(10), u_mm(5)]);
}

include <../../../keyboard.scad>
// main file
use <base.scad>

top_plate(layout(), circuits=circuit())
  the_case();
